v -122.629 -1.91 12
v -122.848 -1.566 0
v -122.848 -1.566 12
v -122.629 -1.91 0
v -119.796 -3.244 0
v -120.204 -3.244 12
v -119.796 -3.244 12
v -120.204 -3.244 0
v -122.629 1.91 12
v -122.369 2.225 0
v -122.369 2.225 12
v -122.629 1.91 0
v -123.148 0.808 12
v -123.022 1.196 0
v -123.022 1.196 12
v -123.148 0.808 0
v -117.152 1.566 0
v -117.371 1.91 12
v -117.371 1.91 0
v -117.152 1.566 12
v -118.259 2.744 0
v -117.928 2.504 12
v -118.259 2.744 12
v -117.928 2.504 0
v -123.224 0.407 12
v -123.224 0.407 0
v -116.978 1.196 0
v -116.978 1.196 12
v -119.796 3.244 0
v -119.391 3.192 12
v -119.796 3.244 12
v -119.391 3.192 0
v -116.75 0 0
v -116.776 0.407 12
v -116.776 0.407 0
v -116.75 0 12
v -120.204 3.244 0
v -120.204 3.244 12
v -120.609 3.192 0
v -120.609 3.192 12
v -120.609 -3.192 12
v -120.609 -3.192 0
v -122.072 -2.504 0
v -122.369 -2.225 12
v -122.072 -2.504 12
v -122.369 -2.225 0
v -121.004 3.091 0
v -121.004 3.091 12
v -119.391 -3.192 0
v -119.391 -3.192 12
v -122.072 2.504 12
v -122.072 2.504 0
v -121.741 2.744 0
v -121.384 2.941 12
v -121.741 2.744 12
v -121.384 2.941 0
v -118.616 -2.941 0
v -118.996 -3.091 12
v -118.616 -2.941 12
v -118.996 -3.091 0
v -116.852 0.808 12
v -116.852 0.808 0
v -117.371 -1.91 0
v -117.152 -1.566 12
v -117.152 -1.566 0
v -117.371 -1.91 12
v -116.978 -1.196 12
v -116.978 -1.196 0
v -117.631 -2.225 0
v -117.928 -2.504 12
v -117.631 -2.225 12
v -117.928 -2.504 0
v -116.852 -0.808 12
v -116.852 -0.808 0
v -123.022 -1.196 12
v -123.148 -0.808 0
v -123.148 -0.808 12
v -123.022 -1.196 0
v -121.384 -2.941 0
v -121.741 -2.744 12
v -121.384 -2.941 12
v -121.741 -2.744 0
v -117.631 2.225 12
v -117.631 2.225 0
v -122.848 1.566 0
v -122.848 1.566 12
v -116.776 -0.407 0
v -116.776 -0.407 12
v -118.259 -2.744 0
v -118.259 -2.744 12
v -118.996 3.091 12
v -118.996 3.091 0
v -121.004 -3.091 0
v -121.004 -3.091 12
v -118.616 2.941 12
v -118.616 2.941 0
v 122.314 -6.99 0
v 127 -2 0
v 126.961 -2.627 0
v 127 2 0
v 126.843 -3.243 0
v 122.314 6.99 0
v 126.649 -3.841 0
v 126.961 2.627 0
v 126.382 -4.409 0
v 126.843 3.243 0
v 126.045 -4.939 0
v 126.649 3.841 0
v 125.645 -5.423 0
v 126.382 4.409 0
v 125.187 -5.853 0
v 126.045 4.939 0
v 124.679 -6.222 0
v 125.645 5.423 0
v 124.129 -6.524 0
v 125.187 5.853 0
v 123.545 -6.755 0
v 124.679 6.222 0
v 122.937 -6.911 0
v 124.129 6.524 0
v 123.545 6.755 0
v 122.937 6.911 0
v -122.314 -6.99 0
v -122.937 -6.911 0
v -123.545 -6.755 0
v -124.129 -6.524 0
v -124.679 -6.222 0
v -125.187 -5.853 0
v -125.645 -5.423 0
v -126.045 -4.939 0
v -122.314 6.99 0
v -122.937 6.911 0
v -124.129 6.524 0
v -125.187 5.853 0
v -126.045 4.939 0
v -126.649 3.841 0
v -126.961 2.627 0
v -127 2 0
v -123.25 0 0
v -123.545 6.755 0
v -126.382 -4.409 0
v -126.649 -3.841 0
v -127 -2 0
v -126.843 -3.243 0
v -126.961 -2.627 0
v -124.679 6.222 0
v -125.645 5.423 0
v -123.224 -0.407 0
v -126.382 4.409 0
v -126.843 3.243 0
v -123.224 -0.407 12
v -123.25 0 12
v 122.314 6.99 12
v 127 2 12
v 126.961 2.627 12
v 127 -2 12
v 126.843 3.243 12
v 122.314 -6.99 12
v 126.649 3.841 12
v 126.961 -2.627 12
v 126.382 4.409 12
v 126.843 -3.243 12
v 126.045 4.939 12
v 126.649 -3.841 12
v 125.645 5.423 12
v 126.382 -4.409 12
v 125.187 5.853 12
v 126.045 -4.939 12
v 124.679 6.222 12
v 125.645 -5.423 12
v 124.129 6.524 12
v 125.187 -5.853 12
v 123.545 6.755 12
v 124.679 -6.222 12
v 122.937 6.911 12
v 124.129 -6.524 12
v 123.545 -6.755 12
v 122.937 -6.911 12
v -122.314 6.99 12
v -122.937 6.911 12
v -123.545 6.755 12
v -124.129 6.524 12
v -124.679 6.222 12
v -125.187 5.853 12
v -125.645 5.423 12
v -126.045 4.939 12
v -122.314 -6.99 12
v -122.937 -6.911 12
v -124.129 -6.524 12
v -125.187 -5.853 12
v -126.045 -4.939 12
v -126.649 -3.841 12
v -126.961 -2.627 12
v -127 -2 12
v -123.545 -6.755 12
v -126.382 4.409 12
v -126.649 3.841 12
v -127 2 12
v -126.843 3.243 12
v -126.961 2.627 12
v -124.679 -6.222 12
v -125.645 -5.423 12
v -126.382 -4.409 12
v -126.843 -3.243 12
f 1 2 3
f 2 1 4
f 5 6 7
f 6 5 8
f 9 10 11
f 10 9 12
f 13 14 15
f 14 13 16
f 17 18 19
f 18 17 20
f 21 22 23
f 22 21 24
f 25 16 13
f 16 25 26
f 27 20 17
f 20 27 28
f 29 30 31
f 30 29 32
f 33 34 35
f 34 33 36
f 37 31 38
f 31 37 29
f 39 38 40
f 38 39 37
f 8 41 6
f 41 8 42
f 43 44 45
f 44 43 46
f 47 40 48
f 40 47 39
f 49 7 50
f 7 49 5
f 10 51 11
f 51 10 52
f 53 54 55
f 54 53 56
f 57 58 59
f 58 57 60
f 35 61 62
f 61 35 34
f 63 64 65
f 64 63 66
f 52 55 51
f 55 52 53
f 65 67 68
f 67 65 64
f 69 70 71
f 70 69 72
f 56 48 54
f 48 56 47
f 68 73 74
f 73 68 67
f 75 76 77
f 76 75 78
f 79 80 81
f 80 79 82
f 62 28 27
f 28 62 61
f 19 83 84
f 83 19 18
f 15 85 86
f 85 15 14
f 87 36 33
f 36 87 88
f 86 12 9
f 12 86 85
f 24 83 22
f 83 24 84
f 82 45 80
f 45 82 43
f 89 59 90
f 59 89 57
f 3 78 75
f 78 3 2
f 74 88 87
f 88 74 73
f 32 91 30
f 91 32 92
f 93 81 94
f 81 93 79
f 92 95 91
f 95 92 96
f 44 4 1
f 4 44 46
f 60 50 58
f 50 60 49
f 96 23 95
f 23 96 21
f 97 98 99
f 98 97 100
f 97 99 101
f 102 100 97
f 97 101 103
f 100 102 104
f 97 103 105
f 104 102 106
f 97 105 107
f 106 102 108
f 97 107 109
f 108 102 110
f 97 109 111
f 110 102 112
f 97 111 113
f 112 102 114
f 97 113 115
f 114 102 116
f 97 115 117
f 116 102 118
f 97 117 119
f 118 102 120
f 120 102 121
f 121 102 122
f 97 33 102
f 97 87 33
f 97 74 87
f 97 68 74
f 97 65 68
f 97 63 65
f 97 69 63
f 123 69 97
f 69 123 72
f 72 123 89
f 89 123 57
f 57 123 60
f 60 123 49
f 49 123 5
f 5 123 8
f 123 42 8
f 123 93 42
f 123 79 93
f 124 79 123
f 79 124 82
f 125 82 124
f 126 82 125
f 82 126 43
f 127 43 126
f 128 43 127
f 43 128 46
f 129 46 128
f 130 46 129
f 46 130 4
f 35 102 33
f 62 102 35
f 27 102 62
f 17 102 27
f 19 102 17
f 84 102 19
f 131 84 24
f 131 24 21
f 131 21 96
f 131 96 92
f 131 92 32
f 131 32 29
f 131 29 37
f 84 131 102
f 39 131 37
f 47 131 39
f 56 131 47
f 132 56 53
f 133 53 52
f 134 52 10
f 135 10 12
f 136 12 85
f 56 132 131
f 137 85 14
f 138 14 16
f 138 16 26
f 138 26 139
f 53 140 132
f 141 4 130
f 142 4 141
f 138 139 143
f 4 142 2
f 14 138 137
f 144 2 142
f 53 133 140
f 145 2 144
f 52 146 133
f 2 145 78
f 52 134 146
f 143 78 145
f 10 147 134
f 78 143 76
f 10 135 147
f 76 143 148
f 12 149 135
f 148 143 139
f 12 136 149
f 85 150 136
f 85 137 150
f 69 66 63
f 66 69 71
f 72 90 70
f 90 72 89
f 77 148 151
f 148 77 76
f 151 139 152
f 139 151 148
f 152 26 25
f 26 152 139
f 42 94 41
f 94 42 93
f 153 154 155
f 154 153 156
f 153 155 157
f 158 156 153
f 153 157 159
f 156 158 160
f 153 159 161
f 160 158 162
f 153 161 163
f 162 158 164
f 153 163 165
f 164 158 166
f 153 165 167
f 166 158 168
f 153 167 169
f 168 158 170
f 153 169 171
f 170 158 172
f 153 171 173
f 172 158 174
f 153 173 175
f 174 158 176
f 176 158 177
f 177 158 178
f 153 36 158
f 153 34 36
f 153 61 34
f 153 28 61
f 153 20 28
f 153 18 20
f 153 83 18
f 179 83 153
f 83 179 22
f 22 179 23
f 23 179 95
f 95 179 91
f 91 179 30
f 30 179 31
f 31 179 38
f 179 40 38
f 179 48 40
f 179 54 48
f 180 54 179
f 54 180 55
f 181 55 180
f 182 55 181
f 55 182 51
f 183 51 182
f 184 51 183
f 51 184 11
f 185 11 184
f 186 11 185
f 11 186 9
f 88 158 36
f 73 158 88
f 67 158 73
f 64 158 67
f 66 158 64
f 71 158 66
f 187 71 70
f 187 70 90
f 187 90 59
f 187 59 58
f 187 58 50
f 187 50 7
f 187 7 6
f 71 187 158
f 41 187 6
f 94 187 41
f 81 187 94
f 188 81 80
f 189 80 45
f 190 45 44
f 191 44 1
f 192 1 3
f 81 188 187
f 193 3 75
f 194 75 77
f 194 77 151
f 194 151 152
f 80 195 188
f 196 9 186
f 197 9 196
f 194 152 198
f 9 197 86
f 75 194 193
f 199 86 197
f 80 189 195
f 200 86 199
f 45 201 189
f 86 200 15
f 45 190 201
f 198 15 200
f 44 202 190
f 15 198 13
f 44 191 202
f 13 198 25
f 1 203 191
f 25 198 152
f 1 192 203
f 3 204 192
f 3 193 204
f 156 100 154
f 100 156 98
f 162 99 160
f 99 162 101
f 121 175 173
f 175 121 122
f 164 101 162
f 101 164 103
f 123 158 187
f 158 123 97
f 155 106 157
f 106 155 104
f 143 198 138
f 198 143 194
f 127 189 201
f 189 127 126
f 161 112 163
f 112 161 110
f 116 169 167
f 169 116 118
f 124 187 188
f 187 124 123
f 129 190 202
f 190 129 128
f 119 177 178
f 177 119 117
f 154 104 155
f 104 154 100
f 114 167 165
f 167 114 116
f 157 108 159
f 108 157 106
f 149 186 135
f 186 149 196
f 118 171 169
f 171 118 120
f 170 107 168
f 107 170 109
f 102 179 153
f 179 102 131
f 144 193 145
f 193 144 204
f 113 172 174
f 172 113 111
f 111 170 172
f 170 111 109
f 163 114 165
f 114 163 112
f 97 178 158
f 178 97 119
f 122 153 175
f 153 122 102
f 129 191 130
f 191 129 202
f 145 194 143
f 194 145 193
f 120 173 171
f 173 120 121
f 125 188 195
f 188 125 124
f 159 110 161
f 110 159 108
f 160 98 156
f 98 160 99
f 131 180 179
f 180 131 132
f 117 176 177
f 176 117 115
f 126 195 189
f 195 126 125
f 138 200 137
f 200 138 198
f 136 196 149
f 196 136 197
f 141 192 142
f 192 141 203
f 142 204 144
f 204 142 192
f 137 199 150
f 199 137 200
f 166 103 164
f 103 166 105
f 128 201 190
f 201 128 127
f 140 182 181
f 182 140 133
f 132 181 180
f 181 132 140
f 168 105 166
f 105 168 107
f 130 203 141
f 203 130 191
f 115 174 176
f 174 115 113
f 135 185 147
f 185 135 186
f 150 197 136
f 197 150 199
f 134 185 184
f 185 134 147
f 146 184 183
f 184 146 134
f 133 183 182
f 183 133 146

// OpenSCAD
$fn = 50;


difference() {
	union() {
		hull() {
			translate(v = [-122.0000000000, 2.0000000000, 0]) {
				cylinder(h = 12, r = 5);
			}
			translate(v = [122.0000000000, 2.0000000000, 0]) {
				cylinder(h = 12, r = 5);
			}
			translate(v = [-122.0000000000, -2.0000000000, 0]) {
				cylinder(h = 12, r = 5);
			}
			translate(v = [122.0000000000, -2.0000000000, 0]) {
				cylinder(h = 12, r = 5);
			}
		}
	}
	union() {
		translate(v = [-120.0000000000, 0.0000000000, 0]) {
			cylinder(h = 12, r = 3.2500000000);
		}
		translate(v = [-120.0000000000, 0.0000000000, 0]) {
			cylinder(h = 12, r = 1.8000000000);
		}
		translate(v = [-120.0000000000, 0.0000000000, 0]) {
			cylinder(h = 12, r = 1.8000000000);
		}
		translate(v = [-120.0000000000, 0.0000000000, 0]) {
			cylinder(h = 12, r = 1.8000000000);
		}
	}
}
